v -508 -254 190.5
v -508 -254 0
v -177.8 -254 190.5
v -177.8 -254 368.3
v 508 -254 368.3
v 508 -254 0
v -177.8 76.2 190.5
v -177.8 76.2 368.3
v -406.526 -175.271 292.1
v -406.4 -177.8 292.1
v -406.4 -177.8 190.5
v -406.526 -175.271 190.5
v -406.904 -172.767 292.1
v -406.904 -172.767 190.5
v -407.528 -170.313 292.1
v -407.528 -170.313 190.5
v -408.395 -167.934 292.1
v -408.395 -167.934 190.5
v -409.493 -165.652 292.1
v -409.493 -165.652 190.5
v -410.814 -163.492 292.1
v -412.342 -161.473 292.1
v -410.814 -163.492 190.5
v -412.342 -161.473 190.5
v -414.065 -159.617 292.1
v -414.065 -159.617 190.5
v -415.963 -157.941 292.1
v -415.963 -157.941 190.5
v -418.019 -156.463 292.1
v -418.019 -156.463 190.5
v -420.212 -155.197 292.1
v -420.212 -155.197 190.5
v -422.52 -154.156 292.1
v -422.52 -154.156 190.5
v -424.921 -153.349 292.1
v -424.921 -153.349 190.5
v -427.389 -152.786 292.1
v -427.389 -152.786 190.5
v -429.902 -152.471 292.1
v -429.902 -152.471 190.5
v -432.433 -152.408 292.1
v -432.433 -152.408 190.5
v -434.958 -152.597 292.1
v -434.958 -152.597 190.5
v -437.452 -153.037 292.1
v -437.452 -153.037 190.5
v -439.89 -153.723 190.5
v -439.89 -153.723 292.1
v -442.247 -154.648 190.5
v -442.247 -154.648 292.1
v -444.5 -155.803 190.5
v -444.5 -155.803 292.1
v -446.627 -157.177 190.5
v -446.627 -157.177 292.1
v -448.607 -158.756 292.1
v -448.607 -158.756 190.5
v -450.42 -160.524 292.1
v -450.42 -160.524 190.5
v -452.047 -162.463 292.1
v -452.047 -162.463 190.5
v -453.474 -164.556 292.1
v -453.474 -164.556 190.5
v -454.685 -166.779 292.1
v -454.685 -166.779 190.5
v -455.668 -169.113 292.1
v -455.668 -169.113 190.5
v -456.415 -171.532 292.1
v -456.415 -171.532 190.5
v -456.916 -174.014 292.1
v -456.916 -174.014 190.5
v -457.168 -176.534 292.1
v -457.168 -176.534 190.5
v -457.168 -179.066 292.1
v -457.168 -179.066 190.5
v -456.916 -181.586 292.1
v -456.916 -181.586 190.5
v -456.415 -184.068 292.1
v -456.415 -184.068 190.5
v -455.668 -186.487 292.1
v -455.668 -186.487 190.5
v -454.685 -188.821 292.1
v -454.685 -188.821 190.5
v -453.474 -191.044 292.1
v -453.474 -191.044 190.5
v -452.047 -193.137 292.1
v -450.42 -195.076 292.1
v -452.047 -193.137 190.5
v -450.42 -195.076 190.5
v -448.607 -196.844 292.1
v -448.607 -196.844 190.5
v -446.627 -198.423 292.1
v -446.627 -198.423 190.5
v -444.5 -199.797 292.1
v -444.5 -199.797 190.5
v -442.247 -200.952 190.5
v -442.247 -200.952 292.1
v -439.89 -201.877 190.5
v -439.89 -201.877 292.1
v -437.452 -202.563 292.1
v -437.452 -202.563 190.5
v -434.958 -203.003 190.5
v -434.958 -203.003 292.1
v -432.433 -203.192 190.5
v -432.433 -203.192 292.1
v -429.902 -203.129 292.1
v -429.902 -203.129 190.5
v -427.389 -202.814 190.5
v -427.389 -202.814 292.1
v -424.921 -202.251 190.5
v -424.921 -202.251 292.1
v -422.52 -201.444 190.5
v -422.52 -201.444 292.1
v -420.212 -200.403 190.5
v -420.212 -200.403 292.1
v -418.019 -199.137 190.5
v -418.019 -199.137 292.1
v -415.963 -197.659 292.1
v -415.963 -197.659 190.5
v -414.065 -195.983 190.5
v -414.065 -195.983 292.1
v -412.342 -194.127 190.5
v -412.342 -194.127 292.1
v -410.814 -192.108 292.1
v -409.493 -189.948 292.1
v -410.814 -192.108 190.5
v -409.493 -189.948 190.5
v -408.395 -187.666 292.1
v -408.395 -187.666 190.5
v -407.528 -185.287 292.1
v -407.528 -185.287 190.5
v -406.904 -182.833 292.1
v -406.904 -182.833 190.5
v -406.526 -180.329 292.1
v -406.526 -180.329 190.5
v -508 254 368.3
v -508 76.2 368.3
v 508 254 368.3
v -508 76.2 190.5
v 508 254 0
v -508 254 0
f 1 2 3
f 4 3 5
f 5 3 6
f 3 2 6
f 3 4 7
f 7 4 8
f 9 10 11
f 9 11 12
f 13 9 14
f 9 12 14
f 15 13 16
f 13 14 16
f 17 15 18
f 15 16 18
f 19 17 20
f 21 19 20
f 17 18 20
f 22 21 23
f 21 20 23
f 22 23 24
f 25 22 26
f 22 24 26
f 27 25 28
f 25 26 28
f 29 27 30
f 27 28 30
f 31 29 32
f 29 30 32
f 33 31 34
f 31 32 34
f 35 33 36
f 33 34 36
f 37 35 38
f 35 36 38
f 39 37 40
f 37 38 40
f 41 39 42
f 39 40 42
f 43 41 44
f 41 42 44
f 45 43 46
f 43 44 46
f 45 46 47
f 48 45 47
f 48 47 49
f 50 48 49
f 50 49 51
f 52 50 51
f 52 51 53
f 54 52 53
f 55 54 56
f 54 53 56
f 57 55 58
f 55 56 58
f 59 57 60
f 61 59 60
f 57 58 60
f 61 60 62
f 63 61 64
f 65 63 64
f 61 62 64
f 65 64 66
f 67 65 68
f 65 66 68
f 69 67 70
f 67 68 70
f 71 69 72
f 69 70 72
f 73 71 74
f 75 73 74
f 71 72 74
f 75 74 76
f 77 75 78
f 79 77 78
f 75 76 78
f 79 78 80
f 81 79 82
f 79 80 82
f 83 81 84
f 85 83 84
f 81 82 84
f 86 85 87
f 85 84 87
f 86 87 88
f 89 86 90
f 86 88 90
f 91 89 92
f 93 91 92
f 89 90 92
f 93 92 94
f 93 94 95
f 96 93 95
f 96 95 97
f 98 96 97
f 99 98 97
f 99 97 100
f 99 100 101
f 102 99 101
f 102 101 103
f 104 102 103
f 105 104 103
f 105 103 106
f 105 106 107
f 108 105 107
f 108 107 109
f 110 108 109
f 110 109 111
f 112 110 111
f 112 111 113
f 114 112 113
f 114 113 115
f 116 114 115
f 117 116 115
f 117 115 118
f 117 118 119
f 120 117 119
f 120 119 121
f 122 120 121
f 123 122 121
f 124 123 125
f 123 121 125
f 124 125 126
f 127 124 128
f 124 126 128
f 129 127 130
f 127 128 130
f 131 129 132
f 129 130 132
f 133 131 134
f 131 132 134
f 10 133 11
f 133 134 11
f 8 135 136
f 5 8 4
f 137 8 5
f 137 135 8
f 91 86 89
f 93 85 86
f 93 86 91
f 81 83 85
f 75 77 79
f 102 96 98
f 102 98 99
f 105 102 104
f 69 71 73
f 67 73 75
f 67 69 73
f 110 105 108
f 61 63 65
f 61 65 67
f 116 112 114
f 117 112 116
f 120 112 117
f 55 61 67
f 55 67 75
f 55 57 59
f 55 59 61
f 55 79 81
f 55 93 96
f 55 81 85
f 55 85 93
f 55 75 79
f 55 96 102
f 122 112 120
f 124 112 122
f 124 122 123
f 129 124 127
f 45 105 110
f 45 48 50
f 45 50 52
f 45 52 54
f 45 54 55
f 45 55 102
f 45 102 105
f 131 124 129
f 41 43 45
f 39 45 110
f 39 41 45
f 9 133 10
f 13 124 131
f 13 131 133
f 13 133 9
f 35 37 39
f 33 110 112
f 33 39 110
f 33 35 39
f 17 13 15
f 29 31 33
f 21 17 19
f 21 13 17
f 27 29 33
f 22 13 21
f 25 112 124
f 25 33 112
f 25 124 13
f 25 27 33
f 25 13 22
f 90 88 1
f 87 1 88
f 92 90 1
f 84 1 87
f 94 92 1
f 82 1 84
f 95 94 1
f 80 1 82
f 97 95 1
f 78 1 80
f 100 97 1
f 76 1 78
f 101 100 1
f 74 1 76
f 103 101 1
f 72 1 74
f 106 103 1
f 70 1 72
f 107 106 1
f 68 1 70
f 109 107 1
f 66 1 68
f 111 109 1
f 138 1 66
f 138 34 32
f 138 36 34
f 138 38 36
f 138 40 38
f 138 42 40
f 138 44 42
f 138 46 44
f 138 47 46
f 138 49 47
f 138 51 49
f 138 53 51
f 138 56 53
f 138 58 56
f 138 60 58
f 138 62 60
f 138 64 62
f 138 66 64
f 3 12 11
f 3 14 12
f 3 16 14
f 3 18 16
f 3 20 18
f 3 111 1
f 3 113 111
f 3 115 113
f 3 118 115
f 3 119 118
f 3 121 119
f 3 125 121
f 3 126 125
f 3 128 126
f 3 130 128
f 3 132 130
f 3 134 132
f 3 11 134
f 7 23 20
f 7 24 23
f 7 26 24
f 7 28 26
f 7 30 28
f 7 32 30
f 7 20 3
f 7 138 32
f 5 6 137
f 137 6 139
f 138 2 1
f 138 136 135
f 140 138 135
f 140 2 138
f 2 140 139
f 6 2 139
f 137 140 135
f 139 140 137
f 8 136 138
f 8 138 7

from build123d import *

# Parameters (mm, degrees)
F0_W     = 1016
F0_H     = 508
F1_DEPTH = 368.3
F2_W     = 330.2
F2_H     = 330.2
F3_DEPTH = 177.8
F4_R     = 25.4
F5_DEPTH = 101.6


with BuildPart() as f1:
    # F0 (on Top) → F1 (new body)
    with BuildSketch(Plane.XY):
        Rectangle(F0_W, F0_H)
    extrude(amount=F1_DEPTH)

    # F2 (on face) → F3 (cut)
    with BuildSketch(Plane.XY.offset(368.3)):
        with Locations((-342.9, -88.9)):
            Rectangle(F2_W, F2_H)
    extrude(amount=-F3_DEPTH, mode=Mode.SUBTRACT)

    # F4 (on face) → F5 (join)
    with BuildSketch(Plane.XY.offset(190.5)):
        with Locations((-431.8, -177.8)):
            Circle(F4_R)
    extrude(amount=F5_DEPTH)


solid = f1.part
